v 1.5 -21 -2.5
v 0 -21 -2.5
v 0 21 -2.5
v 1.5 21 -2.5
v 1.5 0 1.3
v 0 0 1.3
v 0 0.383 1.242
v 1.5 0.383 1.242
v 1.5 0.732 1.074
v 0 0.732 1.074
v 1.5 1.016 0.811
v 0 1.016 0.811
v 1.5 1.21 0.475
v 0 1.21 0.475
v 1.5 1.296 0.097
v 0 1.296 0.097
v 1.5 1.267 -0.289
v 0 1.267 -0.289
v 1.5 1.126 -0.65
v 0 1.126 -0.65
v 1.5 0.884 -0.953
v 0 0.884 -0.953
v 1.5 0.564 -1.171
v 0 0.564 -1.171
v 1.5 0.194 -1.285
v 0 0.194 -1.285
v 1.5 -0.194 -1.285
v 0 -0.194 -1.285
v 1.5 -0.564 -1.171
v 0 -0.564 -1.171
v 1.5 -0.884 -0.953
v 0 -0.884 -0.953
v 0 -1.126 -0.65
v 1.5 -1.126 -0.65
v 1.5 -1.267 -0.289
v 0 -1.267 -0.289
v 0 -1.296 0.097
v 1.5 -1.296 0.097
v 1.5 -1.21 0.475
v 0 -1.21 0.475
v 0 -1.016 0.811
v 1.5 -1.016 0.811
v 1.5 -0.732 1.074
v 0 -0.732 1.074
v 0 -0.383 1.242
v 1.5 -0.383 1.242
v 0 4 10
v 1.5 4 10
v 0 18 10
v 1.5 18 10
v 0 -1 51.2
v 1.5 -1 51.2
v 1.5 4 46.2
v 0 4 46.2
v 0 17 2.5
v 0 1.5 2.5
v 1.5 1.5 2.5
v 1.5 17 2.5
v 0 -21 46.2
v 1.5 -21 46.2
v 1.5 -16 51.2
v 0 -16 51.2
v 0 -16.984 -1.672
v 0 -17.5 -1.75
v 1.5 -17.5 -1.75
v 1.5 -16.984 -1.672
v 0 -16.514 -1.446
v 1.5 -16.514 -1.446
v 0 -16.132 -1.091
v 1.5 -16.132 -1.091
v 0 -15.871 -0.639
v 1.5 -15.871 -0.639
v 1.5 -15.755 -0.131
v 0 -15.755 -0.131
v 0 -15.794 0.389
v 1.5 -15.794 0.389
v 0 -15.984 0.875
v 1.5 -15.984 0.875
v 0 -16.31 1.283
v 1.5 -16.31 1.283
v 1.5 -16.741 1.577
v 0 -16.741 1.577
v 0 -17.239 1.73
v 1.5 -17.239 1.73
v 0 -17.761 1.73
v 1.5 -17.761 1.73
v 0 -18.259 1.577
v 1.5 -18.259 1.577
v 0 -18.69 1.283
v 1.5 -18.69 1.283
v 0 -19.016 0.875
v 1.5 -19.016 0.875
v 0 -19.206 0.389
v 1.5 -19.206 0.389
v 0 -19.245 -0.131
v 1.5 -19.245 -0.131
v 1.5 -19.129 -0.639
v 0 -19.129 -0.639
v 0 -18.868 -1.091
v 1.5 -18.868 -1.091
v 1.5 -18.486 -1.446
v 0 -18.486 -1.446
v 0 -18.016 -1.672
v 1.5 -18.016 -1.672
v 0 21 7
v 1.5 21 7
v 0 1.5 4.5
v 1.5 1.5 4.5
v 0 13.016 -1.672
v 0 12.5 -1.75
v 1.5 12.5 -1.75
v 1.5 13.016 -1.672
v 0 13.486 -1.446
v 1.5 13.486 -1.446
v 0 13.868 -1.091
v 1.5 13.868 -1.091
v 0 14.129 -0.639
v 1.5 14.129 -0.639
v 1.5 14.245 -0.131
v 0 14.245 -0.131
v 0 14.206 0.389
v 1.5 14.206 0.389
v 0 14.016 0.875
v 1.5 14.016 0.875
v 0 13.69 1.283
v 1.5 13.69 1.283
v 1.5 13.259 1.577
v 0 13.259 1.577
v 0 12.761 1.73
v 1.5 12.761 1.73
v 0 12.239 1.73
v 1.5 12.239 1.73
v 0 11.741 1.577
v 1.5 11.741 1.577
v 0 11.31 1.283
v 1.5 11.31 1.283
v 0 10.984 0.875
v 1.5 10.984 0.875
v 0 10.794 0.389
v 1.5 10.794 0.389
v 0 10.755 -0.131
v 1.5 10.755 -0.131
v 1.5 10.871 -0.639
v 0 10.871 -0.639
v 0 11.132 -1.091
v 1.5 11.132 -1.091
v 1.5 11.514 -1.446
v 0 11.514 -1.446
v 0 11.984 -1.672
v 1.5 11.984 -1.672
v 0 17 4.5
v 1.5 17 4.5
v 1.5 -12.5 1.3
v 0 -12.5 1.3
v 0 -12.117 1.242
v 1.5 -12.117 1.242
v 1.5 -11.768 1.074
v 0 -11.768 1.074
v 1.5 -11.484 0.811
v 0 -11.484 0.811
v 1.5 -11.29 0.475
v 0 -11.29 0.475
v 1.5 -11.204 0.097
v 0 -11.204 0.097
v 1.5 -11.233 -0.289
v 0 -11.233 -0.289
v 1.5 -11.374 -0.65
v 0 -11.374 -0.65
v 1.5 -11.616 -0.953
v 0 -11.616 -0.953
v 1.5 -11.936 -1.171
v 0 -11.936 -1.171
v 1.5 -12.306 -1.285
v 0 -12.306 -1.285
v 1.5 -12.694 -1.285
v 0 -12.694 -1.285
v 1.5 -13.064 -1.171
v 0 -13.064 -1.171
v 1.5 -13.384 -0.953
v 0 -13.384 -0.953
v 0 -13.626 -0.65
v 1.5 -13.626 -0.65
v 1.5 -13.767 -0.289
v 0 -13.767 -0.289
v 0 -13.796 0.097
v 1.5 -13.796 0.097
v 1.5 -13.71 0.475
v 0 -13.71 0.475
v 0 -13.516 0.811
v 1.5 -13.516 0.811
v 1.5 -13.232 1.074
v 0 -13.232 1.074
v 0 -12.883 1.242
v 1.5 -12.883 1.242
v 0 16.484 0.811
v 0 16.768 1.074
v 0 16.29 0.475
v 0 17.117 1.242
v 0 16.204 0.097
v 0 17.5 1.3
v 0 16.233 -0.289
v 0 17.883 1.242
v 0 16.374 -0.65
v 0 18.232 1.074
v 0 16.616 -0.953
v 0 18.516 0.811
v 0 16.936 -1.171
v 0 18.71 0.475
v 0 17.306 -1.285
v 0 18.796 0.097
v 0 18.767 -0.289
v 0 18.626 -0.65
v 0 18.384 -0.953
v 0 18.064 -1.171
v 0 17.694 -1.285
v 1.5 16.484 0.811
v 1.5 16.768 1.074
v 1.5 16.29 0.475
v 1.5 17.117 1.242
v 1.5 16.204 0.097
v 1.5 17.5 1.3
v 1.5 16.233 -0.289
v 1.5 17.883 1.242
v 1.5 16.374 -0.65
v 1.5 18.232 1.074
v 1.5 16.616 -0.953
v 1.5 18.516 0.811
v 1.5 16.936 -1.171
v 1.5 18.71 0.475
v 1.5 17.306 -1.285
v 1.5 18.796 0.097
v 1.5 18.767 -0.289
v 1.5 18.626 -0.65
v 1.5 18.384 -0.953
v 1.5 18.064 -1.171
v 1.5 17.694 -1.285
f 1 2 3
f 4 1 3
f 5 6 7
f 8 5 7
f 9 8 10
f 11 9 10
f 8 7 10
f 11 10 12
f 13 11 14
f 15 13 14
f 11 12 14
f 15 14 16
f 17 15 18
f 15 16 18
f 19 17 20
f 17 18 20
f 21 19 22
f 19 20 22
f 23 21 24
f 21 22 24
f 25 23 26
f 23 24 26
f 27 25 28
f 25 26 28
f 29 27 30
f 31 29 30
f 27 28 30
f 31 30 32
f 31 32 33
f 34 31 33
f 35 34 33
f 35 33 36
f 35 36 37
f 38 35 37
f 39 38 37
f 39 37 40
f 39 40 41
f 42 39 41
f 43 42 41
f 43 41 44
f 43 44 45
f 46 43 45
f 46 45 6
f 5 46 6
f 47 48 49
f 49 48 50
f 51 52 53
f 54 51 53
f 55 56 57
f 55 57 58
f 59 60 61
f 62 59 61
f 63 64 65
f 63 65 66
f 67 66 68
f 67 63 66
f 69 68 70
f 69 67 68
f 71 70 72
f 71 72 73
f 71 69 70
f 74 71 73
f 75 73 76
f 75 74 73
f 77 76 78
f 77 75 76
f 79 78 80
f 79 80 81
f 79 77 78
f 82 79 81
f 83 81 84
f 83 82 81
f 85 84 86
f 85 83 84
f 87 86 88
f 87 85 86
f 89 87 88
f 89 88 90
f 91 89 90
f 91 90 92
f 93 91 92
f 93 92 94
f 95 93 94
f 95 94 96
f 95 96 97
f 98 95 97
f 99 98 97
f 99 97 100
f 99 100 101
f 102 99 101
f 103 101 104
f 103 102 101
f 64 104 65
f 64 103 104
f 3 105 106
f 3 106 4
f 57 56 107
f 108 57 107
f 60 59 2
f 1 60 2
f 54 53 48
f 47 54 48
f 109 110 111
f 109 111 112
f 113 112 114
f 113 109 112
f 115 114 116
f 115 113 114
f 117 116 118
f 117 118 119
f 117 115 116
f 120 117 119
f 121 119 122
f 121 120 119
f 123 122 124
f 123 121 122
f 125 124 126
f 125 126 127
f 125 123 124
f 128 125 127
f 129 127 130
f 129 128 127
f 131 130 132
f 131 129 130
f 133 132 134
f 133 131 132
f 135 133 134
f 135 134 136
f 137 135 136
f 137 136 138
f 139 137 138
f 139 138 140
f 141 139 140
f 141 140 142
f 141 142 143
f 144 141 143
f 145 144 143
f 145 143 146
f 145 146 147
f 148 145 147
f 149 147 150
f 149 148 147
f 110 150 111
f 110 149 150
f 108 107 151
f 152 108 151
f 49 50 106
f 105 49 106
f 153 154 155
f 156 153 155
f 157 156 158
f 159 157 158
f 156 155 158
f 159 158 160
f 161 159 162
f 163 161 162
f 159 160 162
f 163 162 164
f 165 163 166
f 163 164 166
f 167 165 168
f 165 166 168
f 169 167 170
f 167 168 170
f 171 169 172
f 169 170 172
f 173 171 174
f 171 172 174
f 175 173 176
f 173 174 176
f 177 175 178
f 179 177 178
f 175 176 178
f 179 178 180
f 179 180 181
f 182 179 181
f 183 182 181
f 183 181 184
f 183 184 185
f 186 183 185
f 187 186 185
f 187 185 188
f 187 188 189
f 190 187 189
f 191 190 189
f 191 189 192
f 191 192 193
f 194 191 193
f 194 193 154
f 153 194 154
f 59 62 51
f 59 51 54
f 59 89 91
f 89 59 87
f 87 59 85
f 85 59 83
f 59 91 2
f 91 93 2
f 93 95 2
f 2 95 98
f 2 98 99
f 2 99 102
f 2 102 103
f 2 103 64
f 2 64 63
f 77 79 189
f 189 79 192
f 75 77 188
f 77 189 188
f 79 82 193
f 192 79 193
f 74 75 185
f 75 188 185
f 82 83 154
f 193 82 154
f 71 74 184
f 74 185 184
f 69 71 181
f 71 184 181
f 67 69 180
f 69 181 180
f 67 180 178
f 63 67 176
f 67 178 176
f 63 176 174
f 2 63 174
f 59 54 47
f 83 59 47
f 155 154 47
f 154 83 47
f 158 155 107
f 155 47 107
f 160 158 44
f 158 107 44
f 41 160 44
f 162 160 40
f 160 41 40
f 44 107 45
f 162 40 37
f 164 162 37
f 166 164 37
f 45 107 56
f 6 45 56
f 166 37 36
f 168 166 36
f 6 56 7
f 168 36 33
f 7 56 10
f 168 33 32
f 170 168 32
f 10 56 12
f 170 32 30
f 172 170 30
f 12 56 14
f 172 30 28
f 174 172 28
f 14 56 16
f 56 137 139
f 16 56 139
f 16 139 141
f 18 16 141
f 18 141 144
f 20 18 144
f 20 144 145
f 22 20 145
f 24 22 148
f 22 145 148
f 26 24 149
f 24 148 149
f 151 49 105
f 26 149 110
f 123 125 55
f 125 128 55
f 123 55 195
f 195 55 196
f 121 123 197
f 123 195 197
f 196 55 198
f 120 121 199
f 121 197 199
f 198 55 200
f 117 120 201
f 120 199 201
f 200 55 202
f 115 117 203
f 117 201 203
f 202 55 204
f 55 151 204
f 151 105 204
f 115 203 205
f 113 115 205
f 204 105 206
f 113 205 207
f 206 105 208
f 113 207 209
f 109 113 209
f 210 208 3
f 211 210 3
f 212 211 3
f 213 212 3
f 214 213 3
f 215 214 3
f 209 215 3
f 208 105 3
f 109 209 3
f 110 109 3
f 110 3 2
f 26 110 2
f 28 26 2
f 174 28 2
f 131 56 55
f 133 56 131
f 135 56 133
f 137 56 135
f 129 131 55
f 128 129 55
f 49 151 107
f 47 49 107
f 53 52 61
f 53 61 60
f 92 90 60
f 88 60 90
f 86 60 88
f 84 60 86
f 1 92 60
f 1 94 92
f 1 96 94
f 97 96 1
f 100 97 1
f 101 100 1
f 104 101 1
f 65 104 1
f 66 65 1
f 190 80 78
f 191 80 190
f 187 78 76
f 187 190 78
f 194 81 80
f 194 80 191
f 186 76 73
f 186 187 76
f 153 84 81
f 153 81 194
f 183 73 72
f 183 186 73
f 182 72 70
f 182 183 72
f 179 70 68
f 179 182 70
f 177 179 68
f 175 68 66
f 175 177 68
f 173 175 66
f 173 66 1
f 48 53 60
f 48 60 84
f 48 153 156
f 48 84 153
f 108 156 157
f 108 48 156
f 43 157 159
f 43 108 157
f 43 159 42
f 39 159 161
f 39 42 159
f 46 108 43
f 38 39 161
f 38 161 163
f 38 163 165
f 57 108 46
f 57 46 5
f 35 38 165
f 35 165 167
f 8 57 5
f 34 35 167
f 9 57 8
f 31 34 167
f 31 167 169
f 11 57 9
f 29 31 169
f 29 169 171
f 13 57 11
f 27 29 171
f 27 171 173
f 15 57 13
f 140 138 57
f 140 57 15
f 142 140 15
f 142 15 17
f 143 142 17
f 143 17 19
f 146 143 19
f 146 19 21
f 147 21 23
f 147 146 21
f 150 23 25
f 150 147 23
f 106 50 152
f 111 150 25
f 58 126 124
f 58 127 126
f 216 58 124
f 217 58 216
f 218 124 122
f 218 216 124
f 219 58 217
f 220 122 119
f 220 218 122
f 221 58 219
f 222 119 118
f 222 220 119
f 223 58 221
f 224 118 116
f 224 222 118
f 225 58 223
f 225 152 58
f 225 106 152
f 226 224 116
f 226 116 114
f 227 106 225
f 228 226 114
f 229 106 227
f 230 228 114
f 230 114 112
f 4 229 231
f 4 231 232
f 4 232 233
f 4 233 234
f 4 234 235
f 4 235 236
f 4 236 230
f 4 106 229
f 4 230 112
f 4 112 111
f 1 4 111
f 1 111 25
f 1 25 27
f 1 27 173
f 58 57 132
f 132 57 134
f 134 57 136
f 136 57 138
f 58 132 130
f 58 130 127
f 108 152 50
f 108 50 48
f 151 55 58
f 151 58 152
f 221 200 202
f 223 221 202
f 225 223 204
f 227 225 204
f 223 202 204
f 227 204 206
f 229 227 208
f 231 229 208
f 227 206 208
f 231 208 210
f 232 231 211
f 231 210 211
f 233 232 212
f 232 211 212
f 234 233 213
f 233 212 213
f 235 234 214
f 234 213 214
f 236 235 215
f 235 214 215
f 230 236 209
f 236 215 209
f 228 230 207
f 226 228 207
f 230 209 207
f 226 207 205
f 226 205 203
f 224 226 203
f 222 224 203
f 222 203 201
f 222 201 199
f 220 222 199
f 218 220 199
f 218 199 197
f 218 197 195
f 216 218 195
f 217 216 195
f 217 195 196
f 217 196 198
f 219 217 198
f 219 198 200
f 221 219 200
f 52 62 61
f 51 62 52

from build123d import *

# Parameters (mm, degrees)
ESQUISSE1_W                            = 53.7
ESQUISSE1_H                            = 42
ESQUISSE1_R                            = 1.75
EXTRUSION1_DEPTH                       = 1.5
FRAISAGE_POUR_VIS_T_TE_FRAIS_E_M2_51_D = 2.59999988
ESQUISSE5_W                            = 2
ESQUISSE5_H                            = 15.5
ENL_V_MAT_EXTRU_1_DEPTH                = 56.35964234
ENL_V_MAT_EXTRU_2_REACH                = 57.36


with BuildPart() as part:
    # Esquisse1 → Extrusion1 (new body)
    with BuildSketch(Plane(origin=(0, 0, 0), x_dir=(0, 0, -1), z_dir=(1, 0, 0))):
        with Locations((-24.35, 0)):
            Rectangle(ESQUISSE1_W, ESQUISSE1_H)
        with Locations((0, -17.5)):
            Circle(ESQUISSE1_R, mode=Mode.SUBTRACT)
        with Locations((0, 12.5)):
            Circle(ESQUISSE1_R, mode=Mode.SUBTRACT)
    extrude(amount=EXTRUSION1_DEPTH)

    # Fraisage pour vis à tête fraisée M2.51 (through all)
    with Locations(Plane(origin=(1.5, 0, 0), x_dir=(0, 0, -1), z_dir=(1, 0, 0))):
        with Locations((0, 17.5), (0, -12.5), (0, 0)):
            Hole(FRAISAGE_POUR_VIS_T_TE_FRAIS_E_M2_51_D / 2)

    # Esquisse5 → Enlèv. mat.-Extru.1 (cut, through all)
    with BuildSketch(Plane.ZY):
        with Locations((3.5, 9.25)):
            Rectangle(ESQUISSE5_W, ESQUISSE5_H)
    extrude(amount=-ENL_V_MAT_EXTRU_1_DEPTH, mode=Mode.SUBTRACT)

    # Esquisse6 → Enlèv. mat.-Extru.2 (cut, up to next)
    with BuildSketch(Plane(origin=(1.5, 0, 0), x_dir=(0, 0, -1), z_dir=(1, 0, 0)), mode=Mode.PRIVATE) as enl_v_mat_extru_2_sk1:
        Polygon((-51.2, 21), (-51.2, -1), (-46.2, 4), (-10, 4), (-10, 18), (-7, 21), align=None)
    enl_v_mat_extru_2_tool1 = extrude(enl_v_mat_extru_2_sk1.sketch, amount=-ENL_V_MAT_EXTRU_2_REACH, mode=Mode.PRIVATE) & part.part
    # Esquisse6 → Enlèv. mat.-Extru.2 (cut, up to next)
    with BuildSketch(Plane(origin=(1.5, 0, 0), x_dir=(0, 0, -1), z_dir=(1, 0, 0)), mode=Mode.PRIVATE) as enl_v_mat_extru_2_sk2:
        Polygon((-51.2, -21), (-46.2, -21), (-51.2, -16), align=None)
    enl_v_mat_extru_2_tool2 = extrude(enl_v_mat_extru_2_sk2.sketch, amount=-ENL_V_MAT_EXTRU_2_REACH, mode=Mode.PRIVATE) & part.part
    add(enl_v_mat_extru_2_tool1.solids().sort_by_distance((1.5, 12.369901, 30.794406))[0], mode=Mode.SUBTRACT)
    add(enl_v_mat_extru_2_tool2.solids().sort_by_distance((1.5, -19.333333, 49.533333))[0], mode=Mode.SUBTRACT)


solid = part.part
